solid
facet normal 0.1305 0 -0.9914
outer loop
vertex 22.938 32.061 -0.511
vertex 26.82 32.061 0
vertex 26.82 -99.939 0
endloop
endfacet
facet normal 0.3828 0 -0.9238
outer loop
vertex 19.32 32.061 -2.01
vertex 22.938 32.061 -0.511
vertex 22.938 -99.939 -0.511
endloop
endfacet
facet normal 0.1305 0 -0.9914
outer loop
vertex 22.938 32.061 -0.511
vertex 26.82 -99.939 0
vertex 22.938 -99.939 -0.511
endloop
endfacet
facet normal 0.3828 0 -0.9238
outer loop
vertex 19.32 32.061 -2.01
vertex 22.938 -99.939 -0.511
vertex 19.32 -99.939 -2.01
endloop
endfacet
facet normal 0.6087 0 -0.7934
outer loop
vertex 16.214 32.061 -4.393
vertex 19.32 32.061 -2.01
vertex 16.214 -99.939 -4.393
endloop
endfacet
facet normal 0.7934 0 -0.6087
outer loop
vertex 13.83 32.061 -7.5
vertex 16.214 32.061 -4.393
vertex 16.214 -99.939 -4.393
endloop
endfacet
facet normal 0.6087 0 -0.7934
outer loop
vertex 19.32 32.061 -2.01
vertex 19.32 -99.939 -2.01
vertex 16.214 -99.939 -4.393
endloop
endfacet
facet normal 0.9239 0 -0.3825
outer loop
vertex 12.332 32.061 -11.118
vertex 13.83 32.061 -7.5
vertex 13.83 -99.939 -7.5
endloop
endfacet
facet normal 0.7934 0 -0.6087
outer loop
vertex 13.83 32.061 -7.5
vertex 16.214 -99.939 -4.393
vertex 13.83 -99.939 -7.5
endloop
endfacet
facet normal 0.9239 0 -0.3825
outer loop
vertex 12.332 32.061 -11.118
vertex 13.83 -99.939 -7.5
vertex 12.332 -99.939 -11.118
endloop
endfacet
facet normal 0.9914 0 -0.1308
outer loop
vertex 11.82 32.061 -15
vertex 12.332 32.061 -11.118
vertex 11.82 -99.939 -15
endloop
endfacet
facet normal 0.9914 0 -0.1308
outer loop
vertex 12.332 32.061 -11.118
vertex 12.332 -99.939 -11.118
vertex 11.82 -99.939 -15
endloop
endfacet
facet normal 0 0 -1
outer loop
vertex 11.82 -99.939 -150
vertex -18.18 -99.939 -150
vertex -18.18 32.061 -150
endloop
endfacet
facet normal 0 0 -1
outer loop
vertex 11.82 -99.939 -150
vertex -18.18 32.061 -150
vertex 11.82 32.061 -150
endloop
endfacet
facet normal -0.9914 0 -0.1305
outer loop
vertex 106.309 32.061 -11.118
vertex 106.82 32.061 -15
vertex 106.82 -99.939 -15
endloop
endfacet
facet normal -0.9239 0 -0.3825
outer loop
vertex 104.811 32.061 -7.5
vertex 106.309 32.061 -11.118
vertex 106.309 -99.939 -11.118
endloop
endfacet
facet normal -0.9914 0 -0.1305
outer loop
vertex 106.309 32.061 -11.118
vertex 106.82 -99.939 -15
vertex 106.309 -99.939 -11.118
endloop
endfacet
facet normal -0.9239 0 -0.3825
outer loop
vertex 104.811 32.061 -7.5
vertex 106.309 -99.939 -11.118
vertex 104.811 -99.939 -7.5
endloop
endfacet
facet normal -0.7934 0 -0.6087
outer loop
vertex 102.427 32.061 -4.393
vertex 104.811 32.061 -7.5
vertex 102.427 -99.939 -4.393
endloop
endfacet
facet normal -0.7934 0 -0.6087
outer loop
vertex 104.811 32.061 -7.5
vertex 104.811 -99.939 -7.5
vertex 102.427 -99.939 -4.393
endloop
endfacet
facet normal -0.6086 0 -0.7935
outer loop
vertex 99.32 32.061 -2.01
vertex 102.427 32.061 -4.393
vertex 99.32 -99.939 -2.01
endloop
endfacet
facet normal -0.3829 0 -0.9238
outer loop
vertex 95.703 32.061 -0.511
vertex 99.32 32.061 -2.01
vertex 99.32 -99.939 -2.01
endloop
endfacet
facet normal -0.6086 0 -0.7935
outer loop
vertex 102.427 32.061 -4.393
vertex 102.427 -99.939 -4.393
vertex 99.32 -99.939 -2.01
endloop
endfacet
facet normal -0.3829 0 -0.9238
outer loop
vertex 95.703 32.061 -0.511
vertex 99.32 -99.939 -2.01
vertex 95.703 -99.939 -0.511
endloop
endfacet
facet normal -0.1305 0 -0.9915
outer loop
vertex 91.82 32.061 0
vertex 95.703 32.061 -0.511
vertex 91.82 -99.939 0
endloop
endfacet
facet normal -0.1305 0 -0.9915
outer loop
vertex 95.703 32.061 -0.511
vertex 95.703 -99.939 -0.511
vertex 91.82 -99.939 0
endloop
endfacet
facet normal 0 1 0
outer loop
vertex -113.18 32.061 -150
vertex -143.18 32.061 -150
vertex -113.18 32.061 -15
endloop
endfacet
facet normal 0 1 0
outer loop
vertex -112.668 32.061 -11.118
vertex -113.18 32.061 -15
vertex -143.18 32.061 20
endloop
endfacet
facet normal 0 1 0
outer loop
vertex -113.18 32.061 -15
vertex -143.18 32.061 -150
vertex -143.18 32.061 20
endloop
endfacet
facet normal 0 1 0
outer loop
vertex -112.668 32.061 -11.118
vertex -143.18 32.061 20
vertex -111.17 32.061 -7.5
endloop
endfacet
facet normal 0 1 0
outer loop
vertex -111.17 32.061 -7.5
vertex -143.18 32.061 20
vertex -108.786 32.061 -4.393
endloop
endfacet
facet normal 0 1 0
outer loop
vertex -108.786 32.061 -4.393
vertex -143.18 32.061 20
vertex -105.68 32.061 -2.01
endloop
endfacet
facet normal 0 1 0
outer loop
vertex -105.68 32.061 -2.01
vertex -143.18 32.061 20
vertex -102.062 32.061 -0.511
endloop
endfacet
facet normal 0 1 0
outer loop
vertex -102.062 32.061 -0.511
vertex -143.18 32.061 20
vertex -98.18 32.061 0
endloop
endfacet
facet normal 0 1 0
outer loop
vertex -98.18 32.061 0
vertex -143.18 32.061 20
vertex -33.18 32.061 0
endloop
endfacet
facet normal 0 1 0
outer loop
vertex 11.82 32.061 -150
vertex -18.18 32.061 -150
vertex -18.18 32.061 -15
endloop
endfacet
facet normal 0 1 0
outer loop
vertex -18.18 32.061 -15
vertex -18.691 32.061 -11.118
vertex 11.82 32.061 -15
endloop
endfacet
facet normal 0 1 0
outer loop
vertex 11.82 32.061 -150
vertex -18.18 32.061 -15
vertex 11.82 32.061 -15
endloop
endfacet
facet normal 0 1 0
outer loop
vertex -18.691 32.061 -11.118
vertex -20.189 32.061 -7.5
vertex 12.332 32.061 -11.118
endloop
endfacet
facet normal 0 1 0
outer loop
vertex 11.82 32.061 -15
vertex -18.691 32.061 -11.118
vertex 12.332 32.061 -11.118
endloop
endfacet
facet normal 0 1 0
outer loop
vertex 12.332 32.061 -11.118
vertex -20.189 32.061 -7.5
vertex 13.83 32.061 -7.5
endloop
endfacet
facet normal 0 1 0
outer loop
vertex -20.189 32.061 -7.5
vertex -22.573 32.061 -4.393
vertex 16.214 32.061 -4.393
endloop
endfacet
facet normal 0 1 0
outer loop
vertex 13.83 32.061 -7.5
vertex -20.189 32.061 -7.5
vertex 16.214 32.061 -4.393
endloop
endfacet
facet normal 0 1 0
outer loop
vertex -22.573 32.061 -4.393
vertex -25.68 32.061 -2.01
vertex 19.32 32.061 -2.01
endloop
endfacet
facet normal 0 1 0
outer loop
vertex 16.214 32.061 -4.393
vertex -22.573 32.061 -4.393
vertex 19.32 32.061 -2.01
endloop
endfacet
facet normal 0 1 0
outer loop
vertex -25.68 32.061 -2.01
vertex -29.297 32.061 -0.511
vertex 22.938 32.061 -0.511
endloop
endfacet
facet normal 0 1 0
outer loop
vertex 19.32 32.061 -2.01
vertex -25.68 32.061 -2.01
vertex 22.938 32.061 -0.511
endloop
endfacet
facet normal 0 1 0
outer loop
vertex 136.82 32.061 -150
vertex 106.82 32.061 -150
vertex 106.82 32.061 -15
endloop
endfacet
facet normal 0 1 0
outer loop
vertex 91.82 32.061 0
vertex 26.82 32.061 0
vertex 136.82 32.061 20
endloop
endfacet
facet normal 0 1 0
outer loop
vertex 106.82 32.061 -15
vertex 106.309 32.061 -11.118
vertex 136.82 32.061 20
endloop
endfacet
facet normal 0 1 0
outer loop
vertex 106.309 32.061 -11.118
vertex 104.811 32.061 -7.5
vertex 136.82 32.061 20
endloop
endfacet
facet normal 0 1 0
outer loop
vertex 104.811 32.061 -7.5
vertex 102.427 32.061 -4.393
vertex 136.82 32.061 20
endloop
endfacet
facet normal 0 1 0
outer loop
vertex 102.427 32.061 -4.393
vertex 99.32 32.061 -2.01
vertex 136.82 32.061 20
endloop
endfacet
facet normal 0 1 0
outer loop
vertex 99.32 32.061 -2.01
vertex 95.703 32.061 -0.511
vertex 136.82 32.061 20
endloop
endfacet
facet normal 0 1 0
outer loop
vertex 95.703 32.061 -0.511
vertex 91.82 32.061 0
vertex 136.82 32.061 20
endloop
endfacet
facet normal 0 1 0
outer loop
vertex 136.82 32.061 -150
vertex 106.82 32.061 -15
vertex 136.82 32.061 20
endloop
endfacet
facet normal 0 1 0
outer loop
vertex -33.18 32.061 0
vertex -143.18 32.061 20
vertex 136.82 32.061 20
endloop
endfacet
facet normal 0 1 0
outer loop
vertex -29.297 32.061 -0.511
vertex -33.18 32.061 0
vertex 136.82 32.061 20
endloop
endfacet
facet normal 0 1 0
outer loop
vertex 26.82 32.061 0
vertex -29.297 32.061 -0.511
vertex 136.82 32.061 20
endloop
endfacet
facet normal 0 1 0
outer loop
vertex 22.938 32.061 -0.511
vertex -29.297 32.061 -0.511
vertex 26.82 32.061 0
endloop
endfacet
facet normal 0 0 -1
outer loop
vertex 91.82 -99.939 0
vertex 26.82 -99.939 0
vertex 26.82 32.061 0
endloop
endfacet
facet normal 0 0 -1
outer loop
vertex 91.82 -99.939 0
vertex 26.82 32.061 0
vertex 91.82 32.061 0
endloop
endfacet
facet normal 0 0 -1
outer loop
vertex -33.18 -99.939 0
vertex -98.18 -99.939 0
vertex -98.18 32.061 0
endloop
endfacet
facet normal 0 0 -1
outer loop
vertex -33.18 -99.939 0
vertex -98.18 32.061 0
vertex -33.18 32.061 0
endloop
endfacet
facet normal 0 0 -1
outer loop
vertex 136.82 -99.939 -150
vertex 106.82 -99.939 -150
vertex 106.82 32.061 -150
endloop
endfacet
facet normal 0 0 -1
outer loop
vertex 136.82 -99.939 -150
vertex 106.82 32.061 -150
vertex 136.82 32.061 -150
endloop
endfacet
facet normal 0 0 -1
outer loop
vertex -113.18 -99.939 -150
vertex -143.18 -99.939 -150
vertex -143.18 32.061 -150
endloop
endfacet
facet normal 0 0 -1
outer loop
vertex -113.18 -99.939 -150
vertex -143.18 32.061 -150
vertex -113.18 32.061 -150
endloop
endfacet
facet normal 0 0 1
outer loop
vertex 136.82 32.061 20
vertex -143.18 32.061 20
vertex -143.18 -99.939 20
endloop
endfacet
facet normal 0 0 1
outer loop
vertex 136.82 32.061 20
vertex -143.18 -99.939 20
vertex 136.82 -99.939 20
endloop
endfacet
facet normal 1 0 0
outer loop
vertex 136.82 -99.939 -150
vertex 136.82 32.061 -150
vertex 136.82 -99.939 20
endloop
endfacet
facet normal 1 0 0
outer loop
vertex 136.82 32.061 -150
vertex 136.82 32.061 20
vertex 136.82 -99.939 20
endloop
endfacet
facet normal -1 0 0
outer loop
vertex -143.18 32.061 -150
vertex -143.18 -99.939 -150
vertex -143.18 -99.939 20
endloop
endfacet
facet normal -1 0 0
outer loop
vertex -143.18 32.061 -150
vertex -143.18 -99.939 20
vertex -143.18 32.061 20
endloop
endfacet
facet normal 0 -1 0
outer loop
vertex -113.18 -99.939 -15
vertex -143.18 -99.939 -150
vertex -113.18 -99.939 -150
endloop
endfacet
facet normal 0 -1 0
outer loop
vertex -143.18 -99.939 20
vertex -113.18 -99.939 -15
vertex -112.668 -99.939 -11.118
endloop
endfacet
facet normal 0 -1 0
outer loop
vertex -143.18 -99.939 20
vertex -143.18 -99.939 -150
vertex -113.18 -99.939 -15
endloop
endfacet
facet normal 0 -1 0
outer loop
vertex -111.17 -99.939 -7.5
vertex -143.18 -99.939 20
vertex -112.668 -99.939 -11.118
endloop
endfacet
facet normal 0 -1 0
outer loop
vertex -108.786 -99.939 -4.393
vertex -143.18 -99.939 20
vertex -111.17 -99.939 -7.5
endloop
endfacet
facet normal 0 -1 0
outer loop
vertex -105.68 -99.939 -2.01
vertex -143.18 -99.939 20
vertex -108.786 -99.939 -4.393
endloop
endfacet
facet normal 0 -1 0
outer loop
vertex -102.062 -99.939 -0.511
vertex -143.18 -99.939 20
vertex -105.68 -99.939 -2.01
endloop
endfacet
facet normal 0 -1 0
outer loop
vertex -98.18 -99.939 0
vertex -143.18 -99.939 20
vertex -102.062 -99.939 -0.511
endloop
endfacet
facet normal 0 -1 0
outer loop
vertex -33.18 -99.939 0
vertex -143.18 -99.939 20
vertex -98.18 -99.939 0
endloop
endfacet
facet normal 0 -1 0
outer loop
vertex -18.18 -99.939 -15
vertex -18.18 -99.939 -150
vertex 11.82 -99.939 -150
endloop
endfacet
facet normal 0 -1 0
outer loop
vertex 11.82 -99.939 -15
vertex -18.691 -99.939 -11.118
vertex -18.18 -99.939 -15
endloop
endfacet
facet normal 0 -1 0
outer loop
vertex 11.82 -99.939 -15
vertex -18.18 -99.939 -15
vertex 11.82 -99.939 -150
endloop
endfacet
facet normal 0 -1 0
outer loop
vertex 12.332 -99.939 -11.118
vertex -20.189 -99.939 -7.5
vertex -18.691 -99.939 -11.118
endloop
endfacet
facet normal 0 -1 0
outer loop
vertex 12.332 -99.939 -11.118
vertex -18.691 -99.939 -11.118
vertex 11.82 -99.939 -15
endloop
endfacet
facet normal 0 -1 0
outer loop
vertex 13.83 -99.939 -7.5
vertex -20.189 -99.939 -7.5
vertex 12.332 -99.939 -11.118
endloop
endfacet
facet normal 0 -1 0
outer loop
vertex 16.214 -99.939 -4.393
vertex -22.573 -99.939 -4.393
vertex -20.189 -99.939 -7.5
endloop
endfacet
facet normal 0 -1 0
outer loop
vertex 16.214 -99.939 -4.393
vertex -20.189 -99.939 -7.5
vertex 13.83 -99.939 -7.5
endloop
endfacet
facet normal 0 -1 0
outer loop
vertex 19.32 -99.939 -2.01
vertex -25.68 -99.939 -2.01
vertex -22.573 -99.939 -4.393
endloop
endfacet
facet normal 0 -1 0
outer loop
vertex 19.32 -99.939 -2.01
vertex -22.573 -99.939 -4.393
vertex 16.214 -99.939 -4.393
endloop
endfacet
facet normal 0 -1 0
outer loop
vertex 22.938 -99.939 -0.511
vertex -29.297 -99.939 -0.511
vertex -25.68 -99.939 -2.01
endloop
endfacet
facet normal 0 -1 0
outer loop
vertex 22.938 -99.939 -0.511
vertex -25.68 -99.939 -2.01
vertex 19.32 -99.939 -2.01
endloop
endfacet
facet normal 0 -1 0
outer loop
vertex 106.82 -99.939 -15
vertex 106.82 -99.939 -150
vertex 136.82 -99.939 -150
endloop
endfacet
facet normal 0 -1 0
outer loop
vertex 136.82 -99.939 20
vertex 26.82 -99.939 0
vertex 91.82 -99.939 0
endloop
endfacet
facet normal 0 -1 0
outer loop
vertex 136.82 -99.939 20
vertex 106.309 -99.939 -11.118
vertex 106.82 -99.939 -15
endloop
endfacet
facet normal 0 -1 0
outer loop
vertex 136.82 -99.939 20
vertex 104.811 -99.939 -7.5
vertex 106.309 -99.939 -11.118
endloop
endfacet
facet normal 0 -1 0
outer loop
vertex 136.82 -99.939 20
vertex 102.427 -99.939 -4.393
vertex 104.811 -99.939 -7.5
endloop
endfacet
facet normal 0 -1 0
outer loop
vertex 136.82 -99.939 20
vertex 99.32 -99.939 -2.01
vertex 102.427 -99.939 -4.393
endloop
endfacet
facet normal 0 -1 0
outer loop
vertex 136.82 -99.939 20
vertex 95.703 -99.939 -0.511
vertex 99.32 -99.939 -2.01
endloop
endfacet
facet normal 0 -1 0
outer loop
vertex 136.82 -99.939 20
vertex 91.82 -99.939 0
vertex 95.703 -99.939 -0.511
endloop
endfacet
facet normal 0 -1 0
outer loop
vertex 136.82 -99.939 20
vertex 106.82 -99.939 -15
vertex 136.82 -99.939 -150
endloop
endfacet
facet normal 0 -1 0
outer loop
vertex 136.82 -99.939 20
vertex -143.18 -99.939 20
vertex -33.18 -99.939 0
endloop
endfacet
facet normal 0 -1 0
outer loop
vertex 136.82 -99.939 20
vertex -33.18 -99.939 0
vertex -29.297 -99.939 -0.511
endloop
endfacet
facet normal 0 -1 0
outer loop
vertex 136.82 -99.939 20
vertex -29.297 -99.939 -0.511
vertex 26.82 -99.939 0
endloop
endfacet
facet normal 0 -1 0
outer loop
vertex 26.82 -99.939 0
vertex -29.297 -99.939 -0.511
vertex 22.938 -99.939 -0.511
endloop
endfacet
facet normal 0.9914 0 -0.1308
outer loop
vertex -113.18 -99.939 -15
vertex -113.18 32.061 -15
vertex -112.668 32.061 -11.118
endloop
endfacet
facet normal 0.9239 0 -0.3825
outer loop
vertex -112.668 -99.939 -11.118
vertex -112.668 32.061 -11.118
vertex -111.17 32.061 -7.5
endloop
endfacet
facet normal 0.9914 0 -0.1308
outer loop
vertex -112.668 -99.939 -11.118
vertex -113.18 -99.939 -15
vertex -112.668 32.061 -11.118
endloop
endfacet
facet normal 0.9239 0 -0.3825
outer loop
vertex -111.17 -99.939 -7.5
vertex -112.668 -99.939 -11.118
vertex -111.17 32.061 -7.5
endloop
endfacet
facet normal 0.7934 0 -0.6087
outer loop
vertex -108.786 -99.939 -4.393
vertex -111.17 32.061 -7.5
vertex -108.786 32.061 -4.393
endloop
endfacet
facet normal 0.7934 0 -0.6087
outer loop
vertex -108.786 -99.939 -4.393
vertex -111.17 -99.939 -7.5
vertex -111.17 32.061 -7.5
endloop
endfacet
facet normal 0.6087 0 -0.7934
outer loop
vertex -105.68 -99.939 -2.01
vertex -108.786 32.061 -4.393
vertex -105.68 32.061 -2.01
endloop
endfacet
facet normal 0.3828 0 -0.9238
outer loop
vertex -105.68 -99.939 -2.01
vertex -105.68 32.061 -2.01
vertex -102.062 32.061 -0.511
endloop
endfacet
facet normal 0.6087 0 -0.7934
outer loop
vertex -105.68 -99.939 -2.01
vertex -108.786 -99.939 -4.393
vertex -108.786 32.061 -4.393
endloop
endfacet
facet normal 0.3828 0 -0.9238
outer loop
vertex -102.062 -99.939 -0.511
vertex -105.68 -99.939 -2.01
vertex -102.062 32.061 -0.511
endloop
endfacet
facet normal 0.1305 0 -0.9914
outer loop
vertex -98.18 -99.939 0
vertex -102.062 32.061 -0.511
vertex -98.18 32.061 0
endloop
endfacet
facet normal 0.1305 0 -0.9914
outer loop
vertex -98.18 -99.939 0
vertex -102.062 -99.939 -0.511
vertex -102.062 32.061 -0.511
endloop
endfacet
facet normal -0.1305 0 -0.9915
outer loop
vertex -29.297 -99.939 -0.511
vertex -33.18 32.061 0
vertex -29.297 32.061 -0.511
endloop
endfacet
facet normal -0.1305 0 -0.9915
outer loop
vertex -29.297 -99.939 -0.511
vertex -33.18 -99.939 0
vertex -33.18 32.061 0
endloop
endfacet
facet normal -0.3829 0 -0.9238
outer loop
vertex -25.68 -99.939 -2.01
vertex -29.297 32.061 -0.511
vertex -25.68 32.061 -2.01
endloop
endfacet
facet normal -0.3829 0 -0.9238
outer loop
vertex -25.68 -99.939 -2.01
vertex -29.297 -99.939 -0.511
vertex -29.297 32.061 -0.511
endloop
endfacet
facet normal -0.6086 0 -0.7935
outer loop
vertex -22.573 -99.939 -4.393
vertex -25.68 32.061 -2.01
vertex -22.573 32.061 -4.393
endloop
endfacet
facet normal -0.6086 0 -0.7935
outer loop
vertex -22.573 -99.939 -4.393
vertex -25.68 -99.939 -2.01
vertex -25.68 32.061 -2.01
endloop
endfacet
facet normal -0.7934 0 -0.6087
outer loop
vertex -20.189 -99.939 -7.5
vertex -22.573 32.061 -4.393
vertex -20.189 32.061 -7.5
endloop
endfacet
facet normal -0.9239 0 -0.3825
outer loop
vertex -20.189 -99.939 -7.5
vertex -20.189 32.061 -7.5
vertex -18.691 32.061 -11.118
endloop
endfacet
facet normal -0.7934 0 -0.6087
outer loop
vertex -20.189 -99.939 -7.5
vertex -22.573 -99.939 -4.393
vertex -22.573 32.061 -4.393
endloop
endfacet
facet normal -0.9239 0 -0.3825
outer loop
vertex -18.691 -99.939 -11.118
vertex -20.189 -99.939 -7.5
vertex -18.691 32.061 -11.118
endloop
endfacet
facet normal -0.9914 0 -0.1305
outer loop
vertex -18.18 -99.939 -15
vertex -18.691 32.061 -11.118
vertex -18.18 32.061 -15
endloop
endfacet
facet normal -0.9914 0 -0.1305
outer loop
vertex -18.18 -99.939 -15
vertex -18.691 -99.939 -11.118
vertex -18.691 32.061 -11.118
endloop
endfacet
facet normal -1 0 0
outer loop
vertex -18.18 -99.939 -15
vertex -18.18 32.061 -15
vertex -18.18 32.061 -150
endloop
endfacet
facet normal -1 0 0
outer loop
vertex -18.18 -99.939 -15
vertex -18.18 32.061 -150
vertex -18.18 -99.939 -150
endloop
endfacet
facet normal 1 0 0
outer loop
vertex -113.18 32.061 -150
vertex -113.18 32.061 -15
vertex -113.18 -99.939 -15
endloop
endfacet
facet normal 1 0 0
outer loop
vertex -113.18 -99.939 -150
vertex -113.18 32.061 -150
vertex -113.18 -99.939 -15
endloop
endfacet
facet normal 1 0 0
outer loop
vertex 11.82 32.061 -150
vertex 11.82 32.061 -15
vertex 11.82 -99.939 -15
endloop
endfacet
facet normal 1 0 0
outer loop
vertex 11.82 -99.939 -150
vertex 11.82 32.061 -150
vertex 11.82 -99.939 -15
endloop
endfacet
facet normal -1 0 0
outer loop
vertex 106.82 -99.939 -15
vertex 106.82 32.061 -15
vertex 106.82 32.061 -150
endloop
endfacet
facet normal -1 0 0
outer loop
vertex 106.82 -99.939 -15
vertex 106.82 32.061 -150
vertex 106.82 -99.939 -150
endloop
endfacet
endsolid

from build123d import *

# Parameters (mm, degrees)
F0_W     = 280
F0_H     = 132
F1_DEPTH = 20
F2_W     = 30
F2_H     = 132
F3_DEPTH = 150
F4_R     = 15
F5_R     = 15


with BuildPart() as f1:
    # F0 (on Top) → F1 (new body)
    with BuildSketch(Plane.XY):
        with Locations((-3.179513, -33.939106)):
            Rectangle(F0_W, F0_H)
    extrude(amount=F1_DEPTH)

    # F2 (on face) → F3 (join)
    with BuildSketch(Plane(origin=(0, 0, 0), x_dir=(1, 0, 0), z_dir=(0, 0, -1))):
        with Locations((121.820487, 33.939106)):
            Rectangle(F2_W, F2_H)
        with Locations((-3.179513, 33.939106)):
            Rectangle(F2_W, F2_H)
        with Locations((-128.179513, 33.939106)):
            Rectangle(F2_W, F2_H)
    extrude(amount=F3_DEPTH)

    # F4
    f4_edges = [f1.edges().sort_by_distance(p)[0] for p in [
        (106.820487, -33.939106, 0),
        (-18.179513, -33.939106, 0),
    ]]
    fillet(f4_edges, radius=F4_R)

    # F5
    f5_edges = [f1.edges().sort_by_distance(p)[0] for p in [
        (-113.179513, -33.939106, 0),
        (11.820487, -33.939106, 0),
    ]]
    fillet(f5_edges, radius=F5_R)


solid = f1.part
